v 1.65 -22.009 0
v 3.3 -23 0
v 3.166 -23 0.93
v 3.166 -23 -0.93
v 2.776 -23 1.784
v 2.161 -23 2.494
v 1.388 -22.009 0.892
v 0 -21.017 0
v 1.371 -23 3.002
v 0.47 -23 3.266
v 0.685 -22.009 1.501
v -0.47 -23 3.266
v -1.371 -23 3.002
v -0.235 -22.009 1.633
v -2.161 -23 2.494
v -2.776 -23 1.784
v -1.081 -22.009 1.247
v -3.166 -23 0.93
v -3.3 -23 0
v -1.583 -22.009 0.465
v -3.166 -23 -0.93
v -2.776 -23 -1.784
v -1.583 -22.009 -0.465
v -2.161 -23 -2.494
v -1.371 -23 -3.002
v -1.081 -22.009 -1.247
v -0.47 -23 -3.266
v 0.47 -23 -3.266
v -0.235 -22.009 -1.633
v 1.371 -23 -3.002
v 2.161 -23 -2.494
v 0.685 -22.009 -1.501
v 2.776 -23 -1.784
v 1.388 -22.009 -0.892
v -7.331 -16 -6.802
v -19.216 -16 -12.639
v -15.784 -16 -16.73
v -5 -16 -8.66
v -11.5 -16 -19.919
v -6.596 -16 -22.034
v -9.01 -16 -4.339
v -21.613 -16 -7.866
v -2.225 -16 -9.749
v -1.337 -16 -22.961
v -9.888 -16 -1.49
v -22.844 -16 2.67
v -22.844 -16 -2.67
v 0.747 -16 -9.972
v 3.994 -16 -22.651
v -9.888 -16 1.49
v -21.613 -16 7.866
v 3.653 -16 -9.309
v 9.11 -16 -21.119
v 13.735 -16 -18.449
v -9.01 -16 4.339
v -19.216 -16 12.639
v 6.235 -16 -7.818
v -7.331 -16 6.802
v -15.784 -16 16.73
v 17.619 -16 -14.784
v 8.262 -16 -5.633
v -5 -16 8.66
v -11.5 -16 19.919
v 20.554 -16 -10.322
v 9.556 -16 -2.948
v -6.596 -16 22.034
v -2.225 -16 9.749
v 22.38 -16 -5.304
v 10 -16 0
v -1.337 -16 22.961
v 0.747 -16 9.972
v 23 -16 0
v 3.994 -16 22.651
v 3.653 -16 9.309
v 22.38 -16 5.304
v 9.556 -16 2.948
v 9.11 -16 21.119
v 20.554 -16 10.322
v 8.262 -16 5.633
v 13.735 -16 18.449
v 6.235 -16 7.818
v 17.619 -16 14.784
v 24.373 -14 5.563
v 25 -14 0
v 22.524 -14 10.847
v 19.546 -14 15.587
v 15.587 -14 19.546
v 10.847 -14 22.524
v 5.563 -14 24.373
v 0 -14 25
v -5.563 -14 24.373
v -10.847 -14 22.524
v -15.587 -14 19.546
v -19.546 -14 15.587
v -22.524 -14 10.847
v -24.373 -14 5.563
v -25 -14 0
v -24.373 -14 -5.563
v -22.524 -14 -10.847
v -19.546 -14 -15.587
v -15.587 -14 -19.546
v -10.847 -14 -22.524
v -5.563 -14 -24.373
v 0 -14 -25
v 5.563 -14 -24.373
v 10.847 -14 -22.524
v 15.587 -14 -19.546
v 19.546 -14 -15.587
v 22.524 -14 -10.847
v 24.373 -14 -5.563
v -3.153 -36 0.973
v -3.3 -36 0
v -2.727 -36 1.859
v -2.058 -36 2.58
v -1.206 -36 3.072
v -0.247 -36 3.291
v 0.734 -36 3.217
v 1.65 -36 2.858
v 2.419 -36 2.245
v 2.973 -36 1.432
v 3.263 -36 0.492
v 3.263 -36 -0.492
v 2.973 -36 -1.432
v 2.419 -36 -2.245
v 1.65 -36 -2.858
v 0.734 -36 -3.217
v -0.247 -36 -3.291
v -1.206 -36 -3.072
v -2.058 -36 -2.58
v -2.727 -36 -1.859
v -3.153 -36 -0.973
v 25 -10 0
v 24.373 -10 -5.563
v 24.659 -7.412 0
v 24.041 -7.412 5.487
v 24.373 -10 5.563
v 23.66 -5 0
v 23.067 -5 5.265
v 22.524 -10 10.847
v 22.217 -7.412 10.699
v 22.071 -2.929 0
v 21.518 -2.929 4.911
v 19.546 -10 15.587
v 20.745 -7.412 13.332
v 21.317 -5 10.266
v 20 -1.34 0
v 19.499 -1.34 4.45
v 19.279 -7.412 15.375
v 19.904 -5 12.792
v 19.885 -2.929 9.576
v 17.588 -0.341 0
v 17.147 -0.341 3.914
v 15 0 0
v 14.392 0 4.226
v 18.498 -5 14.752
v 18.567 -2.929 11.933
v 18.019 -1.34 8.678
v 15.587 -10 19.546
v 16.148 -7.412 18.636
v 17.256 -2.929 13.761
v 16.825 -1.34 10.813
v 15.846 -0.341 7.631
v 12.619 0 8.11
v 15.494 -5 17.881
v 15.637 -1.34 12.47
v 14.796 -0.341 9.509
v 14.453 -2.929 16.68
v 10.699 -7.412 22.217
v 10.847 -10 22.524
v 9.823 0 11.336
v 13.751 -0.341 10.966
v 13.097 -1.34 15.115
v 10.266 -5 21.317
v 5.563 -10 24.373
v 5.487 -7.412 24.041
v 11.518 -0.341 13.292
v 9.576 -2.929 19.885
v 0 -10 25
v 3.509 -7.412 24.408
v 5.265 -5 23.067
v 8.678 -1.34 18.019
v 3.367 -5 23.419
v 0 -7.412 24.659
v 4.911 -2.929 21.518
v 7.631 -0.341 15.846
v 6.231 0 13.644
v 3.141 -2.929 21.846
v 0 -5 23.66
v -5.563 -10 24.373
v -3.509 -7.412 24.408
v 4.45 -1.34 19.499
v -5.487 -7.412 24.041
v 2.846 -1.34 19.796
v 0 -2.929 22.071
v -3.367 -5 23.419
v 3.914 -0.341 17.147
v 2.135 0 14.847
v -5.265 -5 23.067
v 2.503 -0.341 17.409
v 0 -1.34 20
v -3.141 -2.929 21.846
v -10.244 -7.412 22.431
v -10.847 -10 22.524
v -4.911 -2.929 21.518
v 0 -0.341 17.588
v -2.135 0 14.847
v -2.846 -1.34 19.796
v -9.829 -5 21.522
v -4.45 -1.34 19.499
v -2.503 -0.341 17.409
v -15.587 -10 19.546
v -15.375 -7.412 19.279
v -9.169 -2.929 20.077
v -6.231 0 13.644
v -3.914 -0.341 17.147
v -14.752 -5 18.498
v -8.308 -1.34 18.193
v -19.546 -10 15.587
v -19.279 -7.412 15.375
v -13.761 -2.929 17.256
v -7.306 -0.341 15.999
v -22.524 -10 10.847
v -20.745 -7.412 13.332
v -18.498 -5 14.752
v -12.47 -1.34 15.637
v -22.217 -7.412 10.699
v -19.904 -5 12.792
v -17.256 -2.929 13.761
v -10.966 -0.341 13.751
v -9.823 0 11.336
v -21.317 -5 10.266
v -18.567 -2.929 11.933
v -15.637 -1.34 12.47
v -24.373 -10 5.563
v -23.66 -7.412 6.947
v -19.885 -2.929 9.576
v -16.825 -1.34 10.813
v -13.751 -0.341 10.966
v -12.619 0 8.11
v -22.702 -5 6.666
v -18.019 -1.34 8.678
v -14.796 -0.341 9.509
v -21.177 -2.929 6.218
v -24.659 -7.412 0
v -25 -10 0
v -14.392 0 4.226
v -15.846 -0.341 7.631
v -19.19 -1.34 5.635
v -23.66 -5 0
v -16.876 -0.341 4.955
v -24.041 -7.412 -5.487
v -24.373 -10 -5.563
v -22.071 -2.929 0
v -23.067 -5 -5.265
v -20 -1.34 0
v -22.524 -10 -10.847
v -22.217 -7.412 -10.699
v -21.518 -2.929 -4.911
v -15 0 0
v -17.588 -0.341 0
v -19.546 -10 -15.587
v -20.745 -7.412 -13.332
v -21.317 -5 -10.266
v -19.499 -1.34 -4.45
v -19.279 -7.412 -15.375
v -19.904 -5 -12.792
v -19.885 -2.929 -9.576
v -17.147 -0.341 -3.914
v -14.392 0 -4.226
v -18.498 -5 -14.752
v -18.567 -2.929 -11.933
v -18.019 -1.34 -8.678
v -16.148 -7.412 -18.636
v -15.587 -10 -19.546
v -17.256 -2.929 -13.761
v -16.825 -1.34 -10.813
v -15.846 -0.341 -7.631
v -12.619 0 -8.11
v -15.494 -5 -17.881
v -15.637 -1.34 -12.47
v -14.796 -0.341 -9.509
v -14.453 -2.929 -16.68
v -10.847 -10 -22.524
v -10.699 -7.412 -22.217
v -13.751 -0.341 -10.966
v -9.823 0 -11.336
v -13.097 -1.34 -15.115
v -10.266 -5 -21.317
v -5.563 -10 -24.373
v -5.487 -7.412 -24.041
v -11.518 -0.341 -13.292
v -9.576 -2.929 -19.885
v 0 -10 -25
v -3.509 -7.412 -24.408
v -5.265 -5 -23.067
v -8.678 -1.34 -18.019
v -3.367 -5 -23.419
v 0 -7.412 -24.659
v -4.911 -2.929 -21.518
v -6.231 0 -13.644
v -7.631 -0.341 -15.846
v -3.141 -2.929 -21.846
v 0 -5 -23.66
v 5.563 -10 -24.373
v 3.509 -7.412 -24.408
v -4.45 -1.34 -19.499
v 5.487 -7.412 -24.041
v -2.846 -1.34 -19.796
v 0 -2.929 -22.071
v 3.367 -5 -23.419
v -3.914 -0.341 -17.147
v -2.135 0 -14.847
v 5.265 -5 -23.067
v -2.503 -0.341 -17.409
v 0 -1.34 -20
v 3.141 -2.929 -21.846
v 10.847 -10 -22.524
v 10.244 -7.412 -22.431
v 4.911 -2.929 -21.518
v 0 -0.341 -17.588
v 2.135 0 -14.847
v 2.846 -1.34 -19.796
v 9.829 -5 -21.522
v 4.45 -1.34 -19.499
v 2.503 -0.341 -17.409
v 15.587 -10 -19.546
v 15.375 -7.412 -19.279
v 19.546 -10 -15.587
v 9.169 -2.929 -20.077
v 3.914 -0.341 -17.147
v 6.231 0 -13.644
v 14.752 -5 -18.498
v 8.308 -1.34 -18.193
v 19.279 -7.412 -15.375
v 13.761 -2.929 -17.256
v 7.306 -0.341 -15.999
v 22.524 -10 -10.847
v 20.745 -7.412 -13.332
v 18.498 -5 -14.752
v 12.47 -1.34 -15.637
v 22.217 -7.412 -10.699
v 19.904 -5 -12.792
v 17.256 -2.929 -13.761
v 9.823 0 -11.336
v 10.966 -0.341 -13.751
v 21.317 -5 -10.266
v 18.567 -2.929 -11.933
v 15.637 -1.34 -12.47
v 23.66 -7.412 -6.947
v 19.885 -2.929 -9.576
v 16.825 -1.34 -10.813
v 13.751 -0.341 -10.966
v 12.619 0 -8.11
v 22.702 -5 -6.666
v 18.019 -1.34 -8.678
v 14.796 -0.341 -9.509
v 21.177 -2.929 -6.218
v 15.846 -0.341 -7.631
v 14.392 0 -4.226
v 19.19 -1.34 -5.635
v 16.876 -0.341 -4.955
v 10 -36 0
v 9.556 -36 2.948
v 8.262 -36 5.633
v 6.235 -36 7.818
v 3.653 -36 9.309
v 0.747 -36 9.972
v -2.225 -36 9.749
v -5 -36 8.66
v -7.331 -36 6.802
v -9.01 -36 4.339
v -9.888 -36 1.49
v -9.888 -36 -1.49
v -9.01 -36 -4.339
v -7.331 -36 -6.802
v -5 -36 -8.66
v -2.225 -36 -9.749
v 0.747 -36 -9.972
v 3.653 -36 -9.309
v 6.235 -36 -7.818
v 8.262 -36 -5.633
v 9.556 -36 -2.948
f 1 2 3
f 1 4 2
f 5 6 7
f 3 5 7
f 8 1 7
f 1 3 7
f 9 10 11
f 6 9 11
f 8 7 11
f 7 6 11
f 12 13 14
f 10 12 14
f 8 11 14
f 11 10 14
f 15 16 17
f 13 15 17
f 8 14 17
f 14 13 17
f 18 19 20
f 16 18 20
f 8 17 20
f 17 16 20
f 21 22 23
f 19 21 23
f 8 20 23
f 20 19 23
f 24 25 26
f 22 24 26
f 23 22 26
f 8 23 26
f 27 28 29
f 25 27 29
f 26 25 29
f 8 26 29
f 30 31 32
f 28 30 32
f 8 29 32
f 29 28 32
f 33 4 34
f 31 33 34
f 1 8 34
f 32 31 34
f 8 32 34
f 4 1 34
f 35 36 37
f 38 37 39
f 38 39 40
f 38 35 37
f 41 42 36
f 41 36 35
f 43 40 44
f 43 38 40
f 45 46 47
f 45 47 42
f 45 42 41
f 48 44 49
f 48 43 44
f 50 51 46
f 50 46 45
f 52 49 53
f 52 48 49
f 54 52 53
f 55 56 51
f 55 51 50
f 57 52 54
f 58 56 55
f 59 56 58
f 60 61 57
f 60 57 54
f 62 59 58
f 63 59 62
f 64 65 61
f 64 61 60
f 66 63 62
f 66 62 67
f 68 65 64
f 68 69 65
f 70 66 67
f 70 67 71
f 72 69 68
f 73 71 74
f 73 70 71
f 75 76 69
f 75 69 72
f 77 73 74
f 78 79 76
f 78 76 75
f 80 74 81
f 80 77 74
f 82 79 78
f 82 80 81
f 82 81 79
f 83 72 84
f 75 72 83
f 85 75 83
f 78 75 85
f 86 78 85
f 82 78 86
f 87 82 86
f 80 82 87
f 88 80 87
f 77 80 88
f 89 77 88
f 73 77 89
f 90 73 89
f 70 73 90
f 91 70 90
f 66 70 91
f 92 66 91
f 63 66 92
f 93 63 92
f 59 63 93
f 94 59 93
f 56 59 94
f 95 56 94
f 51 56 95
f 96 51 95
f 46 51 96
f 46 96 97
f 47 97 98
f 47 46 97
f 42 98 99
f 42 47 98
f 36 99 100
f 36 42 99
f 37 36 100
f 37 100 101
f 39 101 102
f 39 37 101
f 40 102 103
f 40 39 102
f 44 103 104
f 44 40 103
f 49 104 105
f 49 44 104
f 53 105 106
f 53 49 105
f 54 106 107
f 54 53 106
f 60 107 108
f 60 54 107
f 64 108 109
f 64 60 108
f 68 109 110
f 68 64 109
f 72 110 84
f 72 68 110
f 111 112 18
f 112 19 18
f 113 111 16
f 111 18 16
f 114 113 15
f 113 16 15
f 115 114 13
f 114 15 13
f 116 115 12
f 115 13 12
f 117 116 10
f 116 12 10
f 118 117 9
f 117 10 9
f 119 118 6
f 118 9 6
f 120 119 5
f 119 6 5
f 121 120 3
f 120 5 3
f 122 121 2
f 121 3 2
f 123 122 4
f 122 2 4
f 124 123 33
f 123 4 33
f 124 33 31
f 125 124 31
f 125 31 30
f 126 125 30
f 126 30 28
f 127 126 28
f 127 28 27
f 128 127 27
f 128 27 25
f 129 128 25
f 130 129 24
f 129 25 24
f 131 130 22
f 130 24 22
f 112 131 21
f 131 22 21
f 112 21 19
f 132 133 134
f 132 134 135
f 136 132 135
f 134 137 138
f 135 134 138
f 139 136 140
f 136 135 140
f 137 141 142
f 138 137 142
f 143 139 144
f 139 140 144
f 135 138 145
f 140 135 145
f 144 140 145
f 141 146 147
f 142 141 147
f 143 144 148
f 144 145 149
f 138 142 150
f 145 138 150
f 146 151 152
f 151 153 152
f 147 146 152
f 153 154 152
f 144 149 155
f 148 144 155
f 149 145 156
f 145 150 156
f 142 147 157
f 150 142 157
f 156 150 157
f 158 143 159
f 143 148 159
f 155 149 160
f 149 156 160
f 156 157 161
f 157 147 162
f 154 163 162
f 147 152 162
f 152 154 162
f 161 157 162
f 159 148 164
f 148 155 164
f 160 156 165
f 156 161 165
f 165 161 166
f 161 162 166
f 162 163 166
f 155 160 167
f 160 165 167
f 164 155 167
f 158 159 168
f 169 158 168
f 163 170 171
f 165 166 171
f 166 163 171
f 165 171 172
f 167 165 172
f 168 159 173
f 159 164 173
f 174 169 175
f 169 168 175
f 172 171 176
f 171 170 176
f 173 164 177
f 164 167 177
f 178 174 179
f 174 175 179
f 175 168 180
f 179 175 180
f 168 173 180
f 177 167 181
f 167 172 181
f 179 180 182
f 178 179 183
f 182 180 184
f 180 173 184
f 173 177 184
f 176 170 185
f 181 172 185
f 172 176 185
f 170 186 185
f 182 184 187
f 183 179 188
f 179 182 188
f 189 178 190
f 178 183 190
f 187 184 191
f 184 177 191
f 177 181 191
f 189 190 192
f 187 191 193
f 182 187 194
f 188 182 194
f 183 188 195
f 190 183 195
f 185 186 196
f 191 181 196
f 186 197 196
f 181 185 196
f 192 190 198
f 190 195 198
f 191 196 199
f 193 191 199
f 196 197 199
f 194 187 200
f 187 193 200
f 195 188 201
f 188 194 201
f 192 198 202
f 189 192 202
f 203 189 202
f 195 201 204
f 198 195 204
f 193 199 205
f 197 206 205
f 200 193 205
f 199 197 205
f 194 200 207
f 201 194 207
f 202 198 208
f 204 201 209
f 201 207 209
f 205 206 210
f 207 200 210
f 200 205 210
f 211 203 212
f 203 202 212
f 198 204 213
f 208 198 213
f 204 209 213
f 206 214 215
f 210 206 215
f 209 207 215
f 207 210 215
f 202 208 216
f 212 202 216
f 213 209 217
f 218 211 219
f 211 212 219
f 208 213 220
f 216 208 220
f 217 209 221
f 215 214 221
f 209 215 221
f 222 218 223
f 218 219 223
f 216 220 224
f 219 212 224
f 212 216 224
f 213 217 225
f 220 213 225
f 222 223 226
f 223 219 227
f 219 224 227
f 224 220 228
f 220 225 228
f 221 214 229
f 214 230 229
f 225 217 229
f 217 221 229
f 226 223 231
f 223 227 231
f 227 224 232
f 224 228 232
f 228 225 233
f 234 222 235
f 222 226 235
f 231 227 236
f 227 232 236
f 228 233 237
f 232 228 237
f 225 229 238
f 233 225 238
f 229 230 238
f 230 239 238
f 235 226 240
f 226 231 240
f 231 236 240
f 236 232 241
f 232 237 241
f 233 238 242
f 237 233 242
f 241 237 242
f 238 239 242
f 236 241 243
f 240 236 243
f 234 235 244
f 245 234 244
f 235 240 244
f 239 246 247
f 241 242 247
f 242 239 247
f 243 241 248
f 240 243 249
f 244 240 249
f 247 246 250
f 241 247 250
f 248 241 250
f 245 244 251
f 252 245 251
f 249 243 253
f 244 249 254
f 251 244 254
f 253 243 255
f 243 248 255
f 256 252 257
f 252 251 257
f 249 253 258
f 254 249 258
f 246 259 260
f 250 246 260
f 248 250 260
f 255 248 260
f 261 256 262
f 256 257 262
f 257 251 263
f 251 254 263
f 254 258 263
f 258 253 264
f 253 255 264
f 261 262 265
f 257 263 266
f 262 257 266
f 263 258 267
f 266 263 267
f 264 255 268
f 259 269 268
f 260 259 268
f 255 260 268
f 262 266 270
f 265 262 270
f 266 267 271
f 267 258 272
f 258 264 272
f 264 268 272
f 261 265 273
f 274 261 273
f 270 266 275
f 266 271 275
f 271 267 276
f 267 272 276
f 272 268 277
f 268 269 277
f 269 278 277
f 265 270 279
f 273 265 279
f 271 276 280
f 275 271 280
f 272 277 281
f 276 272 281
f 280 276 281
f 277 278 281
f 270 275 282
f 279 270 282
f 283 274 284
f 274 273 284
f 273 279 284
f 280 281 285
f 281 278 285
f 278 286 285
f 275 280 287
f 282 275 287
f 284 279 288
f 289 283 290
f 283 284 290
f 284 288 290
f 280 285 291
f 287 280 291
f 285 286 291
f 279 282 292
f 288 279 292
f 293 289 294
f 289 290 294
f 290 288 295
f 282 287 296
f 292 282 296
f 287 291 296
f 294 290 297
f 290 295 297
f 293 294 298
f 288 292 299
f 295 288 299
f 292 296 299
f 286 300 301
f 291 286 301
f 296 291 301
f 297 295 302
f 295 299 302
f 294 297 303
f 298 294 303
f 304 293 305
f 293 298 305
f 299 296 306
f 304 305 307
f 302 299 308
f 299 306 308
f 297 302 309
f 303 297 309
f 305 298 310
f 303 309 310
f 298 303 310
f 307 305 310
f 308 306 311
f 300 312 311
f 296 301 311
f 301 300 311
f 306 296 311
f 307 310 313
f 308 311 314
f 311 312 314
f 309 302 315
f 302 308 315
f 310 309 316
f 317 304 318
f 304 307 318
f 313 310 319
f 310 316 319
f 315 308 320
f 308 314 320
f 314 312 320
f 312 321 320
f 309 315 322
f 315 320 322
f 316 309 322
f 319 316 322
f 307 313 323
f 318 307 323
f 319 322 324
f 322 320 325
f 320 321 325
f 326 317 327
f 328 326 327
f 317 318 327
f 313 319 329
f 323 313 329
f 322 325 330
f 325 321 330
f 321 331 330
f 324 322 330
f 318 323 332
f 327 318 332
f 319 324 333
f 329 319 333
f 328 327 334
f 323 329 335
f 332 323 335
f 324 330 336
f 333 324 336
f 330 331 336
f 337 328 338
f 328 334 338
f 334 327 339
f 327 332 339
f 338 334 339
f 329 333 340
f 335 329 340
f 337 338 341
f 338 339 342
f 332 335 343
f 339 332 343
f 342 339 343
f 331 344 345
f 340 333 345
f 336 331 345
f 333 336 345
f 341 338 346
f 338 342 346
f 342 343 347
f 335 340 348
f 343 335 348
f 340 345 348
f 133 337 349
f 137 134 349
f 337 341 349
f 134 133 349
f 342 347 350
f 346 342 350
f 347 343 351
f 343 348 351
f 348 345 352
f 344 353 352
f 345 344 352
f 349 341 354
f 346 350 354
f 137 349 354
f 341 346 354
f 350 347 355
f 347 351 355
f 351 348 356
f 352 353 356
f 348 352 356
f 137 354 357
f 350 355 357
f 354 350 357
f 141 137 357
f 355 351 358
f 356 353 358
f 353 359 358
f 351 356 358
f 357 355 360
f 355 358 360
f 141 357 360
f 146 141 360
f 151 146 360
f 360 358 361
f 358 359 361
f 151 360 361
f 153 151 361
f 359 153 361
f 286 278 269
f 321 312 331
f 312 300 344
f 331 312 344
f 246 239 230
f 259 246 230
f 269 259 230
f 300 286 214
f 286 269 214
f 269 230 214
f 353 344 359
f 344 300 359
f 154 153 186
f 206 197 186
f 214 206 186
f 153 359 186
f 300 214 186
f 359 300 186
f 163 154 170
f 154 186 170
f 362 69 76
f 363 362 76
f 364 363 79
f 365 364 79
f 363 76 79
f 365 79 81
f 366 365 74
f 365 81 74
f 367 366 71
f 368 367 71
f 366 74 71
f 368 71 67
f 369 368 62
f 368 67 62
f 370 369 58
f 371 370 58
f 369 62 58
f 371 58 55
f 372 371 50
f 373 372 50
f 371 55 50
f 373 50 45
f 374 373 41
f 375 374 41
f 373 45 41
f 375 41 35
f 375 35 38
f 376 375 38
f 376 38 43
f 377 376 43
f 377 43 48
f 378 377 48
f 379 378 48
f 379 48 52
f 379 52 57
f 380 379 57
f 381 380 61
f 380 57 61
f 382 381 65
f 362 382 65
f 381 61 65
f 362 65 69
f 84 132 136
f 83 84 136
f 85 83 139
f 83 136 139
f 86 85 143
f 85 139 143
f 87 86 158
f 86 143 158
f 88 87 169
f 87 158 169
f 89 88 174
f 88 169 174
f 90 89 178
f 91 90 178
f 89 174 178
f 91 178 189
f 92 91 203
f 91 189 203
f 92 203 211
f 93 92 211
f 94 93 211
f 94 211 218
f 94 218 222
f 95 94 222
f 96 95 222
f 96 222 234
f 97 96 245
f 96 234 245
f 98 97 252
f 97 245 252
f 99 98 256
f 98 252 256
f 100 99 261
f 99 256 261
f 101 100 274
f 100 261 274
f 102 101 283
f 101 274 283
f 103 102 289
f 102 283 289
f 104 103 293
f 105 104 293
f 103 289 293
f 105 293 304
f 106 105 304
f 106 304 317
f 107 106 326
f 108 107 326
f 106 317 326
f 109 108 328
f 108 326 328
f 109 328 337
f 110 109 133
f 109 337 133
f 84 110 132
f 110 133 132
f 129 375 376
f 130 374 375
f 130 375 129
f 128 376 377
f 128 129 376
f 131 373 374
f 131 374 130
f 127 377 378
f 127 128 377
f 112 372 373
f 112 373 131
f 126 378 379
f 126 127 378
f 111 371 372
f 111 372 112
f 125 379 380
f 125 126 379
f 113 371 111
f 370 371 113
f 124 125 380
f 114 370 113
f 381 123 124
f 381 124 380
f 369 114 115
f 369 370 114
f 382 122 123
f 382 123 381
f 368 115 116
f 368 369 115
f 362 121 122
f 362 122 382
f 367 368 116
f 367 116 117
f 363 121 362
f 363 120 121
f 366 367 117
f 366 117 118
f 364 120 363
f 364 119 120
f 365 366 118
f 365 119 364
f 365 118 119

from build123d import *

# Parameters (mm, degrees)
F0_R     = 25
F1_DEPTH = 16
F2_R     = 10
F3_DEPTH = 20
F4_R     = 10
F5_SIZE  = 2
F7_D     = 6.6
F7_DEPTH = 13
F7_TIP   = 1.9828400428


with BuildPart() as f1:
    # F0 (on Front) → F1 (new body)
    with BuildSketch(Plane.XZ):
        Circle(F0_R)
    extrude(amount=F1_DEPTH)

    # F2 (on face) → F3 (join)
    with BuildSketch(Plane.XZ.offset(16)):
        Circle(F2_R)
    extrude(amount=F3_DEPTH)

    # F4
    f4_edges = [f1.edges().sort_by_distance(p)[0] for p in [
        (-25, 0, 0),
    ]]
    fillet(f4_edges, radius=F4_R)

    # F5
    f5_edges = [f1.edges().sort_by_distance(p)[0] for p in [
        (-25, -16, 0),
    ]]
    chamfer(f5_edges, length=F5_SIZE)

    # F7
    with Locations(Plane.XZ.offset(36)):
        with Locations((0, 0)):
            Hole(F7_D / 2, depth=F7_DEPTH)
            with Locations((0, 0, -(F7_DEPTH + F7_TIP / 2))):  # 118° drill point
                Cone(0, F7_D / 2, F7_TIP, mode=Mode.SUBTRACT)


solid = f1.part
